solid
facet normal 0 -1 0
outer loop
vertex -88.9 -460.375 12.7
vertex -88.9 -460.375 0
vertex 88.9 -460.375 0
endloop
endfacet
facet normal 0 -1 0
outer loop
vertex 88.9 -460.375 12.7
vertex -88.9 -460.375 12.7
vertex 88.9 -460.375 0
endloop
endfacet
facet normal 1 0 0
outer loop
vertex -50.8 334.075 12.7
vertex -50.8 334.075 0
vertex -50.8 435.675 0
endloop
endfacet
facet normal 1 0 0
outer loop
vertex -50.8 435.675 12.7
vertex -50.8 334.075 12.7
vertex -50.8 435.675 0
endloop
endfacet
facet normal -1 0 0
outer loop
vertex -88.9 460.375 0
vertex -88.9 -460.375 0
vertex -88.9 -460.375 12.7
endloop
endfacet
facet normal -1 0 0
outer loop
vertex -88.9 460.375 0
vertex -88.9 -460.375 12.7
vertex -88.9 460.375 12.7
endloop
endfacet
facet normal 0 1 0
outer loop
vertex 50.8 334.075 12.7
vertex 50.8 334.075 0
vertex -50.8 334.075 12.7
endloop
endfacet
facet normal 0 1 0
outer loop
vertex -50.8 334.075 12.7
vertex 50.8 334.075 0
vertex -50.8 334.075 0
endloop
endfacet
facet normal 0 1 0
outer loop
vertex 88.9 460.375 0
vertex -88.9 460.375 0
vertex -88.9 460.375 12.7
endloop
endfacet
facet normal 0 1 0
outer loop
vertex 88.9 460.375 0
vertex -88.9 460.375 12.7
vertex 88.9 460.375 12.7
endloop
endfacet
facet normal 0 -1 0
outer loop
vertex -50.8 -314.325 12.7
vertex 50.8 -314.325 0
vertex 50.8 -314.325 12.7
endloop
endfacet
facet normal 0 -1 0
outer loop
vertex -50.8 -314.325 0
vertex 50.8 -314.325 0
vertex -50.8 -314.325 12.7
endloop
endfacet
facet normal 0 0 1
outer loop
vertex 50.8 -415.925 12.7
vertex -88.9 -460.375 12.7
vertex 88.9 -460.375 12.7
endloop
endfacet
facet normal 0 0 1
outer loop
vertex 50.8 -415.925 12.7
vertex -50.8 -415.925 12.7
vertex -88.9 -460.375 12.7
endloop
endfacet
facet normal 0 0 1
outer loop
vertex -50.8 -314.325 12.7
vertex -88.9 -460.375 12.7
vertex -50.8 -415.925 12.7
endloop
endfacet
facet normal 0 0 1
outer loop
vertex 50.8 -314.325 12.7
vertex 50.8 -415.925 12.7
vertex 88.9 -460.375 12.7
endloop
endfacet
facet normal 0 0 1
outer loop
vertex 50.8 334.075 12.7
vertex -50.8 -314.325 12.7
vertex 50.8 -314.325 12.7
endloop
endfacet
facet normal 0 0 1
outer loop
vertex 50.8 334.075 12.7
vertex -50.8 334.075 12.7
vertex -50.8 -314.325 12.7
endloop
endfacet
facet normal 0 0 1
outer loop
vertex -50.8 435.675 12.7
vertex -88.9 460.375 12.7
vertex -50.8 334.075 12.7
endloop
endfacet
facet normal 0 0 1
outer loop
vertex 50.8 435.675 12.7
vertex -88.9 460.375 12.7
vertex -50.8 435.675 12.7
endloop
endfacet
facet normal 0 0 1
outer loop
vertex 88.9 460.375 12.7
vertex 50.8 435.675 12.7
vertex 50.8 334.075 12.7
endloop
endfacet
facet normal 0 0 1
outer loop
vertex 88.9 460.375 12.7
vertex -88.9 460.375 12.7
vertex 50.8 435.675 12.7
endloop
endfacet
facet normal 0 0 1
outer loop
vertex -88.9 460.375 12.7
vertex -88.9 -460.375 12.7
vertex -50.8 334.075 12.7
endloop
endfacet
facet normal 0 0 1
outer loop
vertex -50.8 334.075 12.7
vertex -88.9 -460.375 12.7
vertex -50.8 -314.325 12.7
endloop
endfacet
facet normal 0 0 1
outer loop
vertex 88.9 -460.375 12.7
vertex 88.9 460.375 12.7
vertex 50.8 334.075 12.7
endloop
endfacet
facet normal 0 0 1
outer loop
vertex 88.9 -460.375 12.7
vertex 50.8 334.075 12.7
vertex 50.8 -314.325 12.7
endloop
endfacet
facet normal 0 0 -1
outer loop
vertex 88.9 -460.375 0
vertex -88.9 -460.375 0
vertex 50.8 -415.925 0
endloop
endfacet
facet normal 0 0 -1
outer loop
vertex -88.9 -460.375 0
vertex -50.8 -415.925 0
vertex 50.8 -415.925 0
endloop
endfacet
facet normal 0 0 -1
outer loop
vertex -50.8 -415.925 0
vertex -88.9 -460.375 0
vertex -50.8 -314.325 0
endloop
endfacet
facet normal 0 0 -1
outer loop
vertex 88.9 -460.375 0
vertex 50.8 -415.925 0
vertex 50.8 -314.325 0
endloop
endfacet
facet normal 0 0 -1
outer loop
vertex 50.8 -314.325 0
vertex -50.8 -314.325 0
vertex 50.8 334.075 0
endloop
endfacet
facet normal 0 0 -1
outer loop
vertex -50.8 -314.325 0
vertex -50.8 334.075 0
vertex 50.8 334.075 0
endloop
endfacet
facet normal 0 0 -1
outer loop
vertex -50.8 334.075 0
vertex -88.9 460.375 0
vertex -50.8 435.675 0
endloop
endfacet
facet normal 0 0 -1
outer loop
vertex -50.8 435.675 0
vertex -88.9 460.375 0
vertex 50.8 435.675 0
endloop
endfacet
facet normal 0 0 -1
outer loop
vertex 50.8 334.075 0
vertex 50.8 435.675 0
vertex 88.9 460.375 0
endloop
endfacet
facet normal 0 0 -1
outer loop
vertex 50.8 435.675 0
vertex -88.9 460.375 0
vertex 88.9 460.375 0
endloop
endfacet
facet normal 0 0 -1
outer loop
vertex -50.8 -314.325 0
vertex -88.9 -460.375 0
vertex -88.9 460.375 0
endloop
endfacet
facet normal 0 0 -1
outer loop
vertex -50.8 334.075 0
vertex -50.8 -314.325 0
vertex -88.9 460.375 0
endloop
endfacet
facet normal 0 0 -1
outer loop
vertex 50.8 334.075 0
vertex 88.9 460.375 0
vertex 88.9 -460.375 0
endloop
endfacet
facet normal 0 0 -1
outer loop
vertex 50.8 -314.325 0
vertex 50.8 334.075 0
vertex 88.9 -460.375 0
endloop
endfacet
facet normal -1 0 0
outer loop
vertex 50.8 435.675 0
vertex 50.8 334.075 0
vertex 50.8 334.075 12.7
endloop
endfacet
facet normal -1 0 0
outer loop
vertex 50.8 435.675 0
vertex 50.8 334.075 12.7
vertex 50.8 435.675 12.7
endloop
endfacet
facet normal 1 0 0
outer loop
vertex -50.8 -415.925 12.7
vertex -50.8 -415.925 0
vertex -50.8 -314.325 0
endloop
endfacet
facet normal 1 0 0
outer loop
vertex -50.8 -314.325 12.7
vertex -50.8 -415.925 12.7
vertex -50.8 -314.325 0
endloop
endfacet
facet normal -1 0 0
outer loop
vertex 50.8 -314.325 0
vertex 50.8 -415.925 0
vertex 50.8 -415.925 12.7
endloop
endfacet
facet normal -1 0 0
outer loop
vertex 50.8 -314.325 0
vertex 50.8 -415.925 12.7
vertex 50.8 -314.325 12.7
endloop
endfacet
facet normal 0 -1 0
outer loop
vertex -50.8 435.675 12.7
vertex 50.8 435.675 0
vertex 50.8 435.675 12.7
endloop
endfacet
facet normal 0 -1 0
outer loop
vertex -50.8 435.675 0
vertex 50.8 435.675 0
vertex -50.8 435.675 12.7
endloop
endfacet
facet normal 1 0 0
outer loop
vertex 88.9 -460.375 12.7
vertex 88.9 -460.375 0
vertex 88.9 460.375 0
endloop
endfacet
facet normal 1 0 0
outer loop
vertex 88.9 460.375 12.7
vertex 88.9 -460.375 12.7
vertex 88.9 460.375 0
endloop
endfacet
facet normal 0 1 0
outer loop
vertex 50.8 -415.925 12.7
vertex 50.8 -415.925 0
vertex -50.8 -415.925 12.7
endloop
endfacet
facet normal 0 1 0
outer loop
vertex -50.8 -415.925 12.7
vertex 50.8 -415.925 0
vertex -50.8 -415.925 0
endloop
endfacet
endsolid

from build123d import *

# Parameters (mm, degrees)
SKETCH1_W           = 177.8
SKETCH1_H           = 920.75
BOSS_EXTRUDE1_DEPTH = 12.7
CUT_EXTRUDE1_REACH  = 471.052
SKETCH2_W           = 101.6
SKETCH2_H           = 101.6


with BuildPart() as part:
    # Sketch1 → Boss-Extrude1 (new body)
    with BuildSketch(Plane.XY):
        Rectangle(SKETCH1_W, SKETCH1_H)
    extrude(amount=BOSS_EXTRUDE1_DEPTH)

    # Sketch2 → Cut-Extrude1 (cut, up to next)
    with BuildSketch(Plane(origin=(0, 0, 0), x_dir=(-1, 0, 0), z_dir=(0, 0, -1)), mode=Mode.PRIVATE) as cut_extrude1_sk1:
        with Locations((0, -365.125)):
            Rectangle(SKETCH2_W, SKETCH2_H)
    cut_extrude1_tool1 = extrude(cut_extrude1_sk1.sketch, amount=-CUT_EXTRUDE1_REACH, mode=Mode.PRIVATE) & part.part
    # Sketch2 → Cut-Extrude1 (cut, up to next)
    with BuildSketch(Plane(origin=(0, 0, 0), x_dir=(-1, 0, 0), z_dir=(0, 0, -1)), mode=Mode.PRIVATE) as cut_extrude1_sk2:
        with Locations((0, 384.875)):
            Rectangle(SKETCH2_W, SKETCH2_H)
    cut_extrude1_tool2 = extrude(cut_extrude1_sk2.sketch, amount=-CUT_EXTRUDE1_REACH, mode=Mode.PRIVATE) & part.part
    add(cut_extrude1_tool1.solids().sort_by_distance((0, -365.125, 0))[0], mode=Mode.SUBTRACT)
    add(cut_extrude1_tool2.solids().sort_by_distance((0, 384.875, 0))[0], mode=Mode.SUBTRACT)


solid = part.part
